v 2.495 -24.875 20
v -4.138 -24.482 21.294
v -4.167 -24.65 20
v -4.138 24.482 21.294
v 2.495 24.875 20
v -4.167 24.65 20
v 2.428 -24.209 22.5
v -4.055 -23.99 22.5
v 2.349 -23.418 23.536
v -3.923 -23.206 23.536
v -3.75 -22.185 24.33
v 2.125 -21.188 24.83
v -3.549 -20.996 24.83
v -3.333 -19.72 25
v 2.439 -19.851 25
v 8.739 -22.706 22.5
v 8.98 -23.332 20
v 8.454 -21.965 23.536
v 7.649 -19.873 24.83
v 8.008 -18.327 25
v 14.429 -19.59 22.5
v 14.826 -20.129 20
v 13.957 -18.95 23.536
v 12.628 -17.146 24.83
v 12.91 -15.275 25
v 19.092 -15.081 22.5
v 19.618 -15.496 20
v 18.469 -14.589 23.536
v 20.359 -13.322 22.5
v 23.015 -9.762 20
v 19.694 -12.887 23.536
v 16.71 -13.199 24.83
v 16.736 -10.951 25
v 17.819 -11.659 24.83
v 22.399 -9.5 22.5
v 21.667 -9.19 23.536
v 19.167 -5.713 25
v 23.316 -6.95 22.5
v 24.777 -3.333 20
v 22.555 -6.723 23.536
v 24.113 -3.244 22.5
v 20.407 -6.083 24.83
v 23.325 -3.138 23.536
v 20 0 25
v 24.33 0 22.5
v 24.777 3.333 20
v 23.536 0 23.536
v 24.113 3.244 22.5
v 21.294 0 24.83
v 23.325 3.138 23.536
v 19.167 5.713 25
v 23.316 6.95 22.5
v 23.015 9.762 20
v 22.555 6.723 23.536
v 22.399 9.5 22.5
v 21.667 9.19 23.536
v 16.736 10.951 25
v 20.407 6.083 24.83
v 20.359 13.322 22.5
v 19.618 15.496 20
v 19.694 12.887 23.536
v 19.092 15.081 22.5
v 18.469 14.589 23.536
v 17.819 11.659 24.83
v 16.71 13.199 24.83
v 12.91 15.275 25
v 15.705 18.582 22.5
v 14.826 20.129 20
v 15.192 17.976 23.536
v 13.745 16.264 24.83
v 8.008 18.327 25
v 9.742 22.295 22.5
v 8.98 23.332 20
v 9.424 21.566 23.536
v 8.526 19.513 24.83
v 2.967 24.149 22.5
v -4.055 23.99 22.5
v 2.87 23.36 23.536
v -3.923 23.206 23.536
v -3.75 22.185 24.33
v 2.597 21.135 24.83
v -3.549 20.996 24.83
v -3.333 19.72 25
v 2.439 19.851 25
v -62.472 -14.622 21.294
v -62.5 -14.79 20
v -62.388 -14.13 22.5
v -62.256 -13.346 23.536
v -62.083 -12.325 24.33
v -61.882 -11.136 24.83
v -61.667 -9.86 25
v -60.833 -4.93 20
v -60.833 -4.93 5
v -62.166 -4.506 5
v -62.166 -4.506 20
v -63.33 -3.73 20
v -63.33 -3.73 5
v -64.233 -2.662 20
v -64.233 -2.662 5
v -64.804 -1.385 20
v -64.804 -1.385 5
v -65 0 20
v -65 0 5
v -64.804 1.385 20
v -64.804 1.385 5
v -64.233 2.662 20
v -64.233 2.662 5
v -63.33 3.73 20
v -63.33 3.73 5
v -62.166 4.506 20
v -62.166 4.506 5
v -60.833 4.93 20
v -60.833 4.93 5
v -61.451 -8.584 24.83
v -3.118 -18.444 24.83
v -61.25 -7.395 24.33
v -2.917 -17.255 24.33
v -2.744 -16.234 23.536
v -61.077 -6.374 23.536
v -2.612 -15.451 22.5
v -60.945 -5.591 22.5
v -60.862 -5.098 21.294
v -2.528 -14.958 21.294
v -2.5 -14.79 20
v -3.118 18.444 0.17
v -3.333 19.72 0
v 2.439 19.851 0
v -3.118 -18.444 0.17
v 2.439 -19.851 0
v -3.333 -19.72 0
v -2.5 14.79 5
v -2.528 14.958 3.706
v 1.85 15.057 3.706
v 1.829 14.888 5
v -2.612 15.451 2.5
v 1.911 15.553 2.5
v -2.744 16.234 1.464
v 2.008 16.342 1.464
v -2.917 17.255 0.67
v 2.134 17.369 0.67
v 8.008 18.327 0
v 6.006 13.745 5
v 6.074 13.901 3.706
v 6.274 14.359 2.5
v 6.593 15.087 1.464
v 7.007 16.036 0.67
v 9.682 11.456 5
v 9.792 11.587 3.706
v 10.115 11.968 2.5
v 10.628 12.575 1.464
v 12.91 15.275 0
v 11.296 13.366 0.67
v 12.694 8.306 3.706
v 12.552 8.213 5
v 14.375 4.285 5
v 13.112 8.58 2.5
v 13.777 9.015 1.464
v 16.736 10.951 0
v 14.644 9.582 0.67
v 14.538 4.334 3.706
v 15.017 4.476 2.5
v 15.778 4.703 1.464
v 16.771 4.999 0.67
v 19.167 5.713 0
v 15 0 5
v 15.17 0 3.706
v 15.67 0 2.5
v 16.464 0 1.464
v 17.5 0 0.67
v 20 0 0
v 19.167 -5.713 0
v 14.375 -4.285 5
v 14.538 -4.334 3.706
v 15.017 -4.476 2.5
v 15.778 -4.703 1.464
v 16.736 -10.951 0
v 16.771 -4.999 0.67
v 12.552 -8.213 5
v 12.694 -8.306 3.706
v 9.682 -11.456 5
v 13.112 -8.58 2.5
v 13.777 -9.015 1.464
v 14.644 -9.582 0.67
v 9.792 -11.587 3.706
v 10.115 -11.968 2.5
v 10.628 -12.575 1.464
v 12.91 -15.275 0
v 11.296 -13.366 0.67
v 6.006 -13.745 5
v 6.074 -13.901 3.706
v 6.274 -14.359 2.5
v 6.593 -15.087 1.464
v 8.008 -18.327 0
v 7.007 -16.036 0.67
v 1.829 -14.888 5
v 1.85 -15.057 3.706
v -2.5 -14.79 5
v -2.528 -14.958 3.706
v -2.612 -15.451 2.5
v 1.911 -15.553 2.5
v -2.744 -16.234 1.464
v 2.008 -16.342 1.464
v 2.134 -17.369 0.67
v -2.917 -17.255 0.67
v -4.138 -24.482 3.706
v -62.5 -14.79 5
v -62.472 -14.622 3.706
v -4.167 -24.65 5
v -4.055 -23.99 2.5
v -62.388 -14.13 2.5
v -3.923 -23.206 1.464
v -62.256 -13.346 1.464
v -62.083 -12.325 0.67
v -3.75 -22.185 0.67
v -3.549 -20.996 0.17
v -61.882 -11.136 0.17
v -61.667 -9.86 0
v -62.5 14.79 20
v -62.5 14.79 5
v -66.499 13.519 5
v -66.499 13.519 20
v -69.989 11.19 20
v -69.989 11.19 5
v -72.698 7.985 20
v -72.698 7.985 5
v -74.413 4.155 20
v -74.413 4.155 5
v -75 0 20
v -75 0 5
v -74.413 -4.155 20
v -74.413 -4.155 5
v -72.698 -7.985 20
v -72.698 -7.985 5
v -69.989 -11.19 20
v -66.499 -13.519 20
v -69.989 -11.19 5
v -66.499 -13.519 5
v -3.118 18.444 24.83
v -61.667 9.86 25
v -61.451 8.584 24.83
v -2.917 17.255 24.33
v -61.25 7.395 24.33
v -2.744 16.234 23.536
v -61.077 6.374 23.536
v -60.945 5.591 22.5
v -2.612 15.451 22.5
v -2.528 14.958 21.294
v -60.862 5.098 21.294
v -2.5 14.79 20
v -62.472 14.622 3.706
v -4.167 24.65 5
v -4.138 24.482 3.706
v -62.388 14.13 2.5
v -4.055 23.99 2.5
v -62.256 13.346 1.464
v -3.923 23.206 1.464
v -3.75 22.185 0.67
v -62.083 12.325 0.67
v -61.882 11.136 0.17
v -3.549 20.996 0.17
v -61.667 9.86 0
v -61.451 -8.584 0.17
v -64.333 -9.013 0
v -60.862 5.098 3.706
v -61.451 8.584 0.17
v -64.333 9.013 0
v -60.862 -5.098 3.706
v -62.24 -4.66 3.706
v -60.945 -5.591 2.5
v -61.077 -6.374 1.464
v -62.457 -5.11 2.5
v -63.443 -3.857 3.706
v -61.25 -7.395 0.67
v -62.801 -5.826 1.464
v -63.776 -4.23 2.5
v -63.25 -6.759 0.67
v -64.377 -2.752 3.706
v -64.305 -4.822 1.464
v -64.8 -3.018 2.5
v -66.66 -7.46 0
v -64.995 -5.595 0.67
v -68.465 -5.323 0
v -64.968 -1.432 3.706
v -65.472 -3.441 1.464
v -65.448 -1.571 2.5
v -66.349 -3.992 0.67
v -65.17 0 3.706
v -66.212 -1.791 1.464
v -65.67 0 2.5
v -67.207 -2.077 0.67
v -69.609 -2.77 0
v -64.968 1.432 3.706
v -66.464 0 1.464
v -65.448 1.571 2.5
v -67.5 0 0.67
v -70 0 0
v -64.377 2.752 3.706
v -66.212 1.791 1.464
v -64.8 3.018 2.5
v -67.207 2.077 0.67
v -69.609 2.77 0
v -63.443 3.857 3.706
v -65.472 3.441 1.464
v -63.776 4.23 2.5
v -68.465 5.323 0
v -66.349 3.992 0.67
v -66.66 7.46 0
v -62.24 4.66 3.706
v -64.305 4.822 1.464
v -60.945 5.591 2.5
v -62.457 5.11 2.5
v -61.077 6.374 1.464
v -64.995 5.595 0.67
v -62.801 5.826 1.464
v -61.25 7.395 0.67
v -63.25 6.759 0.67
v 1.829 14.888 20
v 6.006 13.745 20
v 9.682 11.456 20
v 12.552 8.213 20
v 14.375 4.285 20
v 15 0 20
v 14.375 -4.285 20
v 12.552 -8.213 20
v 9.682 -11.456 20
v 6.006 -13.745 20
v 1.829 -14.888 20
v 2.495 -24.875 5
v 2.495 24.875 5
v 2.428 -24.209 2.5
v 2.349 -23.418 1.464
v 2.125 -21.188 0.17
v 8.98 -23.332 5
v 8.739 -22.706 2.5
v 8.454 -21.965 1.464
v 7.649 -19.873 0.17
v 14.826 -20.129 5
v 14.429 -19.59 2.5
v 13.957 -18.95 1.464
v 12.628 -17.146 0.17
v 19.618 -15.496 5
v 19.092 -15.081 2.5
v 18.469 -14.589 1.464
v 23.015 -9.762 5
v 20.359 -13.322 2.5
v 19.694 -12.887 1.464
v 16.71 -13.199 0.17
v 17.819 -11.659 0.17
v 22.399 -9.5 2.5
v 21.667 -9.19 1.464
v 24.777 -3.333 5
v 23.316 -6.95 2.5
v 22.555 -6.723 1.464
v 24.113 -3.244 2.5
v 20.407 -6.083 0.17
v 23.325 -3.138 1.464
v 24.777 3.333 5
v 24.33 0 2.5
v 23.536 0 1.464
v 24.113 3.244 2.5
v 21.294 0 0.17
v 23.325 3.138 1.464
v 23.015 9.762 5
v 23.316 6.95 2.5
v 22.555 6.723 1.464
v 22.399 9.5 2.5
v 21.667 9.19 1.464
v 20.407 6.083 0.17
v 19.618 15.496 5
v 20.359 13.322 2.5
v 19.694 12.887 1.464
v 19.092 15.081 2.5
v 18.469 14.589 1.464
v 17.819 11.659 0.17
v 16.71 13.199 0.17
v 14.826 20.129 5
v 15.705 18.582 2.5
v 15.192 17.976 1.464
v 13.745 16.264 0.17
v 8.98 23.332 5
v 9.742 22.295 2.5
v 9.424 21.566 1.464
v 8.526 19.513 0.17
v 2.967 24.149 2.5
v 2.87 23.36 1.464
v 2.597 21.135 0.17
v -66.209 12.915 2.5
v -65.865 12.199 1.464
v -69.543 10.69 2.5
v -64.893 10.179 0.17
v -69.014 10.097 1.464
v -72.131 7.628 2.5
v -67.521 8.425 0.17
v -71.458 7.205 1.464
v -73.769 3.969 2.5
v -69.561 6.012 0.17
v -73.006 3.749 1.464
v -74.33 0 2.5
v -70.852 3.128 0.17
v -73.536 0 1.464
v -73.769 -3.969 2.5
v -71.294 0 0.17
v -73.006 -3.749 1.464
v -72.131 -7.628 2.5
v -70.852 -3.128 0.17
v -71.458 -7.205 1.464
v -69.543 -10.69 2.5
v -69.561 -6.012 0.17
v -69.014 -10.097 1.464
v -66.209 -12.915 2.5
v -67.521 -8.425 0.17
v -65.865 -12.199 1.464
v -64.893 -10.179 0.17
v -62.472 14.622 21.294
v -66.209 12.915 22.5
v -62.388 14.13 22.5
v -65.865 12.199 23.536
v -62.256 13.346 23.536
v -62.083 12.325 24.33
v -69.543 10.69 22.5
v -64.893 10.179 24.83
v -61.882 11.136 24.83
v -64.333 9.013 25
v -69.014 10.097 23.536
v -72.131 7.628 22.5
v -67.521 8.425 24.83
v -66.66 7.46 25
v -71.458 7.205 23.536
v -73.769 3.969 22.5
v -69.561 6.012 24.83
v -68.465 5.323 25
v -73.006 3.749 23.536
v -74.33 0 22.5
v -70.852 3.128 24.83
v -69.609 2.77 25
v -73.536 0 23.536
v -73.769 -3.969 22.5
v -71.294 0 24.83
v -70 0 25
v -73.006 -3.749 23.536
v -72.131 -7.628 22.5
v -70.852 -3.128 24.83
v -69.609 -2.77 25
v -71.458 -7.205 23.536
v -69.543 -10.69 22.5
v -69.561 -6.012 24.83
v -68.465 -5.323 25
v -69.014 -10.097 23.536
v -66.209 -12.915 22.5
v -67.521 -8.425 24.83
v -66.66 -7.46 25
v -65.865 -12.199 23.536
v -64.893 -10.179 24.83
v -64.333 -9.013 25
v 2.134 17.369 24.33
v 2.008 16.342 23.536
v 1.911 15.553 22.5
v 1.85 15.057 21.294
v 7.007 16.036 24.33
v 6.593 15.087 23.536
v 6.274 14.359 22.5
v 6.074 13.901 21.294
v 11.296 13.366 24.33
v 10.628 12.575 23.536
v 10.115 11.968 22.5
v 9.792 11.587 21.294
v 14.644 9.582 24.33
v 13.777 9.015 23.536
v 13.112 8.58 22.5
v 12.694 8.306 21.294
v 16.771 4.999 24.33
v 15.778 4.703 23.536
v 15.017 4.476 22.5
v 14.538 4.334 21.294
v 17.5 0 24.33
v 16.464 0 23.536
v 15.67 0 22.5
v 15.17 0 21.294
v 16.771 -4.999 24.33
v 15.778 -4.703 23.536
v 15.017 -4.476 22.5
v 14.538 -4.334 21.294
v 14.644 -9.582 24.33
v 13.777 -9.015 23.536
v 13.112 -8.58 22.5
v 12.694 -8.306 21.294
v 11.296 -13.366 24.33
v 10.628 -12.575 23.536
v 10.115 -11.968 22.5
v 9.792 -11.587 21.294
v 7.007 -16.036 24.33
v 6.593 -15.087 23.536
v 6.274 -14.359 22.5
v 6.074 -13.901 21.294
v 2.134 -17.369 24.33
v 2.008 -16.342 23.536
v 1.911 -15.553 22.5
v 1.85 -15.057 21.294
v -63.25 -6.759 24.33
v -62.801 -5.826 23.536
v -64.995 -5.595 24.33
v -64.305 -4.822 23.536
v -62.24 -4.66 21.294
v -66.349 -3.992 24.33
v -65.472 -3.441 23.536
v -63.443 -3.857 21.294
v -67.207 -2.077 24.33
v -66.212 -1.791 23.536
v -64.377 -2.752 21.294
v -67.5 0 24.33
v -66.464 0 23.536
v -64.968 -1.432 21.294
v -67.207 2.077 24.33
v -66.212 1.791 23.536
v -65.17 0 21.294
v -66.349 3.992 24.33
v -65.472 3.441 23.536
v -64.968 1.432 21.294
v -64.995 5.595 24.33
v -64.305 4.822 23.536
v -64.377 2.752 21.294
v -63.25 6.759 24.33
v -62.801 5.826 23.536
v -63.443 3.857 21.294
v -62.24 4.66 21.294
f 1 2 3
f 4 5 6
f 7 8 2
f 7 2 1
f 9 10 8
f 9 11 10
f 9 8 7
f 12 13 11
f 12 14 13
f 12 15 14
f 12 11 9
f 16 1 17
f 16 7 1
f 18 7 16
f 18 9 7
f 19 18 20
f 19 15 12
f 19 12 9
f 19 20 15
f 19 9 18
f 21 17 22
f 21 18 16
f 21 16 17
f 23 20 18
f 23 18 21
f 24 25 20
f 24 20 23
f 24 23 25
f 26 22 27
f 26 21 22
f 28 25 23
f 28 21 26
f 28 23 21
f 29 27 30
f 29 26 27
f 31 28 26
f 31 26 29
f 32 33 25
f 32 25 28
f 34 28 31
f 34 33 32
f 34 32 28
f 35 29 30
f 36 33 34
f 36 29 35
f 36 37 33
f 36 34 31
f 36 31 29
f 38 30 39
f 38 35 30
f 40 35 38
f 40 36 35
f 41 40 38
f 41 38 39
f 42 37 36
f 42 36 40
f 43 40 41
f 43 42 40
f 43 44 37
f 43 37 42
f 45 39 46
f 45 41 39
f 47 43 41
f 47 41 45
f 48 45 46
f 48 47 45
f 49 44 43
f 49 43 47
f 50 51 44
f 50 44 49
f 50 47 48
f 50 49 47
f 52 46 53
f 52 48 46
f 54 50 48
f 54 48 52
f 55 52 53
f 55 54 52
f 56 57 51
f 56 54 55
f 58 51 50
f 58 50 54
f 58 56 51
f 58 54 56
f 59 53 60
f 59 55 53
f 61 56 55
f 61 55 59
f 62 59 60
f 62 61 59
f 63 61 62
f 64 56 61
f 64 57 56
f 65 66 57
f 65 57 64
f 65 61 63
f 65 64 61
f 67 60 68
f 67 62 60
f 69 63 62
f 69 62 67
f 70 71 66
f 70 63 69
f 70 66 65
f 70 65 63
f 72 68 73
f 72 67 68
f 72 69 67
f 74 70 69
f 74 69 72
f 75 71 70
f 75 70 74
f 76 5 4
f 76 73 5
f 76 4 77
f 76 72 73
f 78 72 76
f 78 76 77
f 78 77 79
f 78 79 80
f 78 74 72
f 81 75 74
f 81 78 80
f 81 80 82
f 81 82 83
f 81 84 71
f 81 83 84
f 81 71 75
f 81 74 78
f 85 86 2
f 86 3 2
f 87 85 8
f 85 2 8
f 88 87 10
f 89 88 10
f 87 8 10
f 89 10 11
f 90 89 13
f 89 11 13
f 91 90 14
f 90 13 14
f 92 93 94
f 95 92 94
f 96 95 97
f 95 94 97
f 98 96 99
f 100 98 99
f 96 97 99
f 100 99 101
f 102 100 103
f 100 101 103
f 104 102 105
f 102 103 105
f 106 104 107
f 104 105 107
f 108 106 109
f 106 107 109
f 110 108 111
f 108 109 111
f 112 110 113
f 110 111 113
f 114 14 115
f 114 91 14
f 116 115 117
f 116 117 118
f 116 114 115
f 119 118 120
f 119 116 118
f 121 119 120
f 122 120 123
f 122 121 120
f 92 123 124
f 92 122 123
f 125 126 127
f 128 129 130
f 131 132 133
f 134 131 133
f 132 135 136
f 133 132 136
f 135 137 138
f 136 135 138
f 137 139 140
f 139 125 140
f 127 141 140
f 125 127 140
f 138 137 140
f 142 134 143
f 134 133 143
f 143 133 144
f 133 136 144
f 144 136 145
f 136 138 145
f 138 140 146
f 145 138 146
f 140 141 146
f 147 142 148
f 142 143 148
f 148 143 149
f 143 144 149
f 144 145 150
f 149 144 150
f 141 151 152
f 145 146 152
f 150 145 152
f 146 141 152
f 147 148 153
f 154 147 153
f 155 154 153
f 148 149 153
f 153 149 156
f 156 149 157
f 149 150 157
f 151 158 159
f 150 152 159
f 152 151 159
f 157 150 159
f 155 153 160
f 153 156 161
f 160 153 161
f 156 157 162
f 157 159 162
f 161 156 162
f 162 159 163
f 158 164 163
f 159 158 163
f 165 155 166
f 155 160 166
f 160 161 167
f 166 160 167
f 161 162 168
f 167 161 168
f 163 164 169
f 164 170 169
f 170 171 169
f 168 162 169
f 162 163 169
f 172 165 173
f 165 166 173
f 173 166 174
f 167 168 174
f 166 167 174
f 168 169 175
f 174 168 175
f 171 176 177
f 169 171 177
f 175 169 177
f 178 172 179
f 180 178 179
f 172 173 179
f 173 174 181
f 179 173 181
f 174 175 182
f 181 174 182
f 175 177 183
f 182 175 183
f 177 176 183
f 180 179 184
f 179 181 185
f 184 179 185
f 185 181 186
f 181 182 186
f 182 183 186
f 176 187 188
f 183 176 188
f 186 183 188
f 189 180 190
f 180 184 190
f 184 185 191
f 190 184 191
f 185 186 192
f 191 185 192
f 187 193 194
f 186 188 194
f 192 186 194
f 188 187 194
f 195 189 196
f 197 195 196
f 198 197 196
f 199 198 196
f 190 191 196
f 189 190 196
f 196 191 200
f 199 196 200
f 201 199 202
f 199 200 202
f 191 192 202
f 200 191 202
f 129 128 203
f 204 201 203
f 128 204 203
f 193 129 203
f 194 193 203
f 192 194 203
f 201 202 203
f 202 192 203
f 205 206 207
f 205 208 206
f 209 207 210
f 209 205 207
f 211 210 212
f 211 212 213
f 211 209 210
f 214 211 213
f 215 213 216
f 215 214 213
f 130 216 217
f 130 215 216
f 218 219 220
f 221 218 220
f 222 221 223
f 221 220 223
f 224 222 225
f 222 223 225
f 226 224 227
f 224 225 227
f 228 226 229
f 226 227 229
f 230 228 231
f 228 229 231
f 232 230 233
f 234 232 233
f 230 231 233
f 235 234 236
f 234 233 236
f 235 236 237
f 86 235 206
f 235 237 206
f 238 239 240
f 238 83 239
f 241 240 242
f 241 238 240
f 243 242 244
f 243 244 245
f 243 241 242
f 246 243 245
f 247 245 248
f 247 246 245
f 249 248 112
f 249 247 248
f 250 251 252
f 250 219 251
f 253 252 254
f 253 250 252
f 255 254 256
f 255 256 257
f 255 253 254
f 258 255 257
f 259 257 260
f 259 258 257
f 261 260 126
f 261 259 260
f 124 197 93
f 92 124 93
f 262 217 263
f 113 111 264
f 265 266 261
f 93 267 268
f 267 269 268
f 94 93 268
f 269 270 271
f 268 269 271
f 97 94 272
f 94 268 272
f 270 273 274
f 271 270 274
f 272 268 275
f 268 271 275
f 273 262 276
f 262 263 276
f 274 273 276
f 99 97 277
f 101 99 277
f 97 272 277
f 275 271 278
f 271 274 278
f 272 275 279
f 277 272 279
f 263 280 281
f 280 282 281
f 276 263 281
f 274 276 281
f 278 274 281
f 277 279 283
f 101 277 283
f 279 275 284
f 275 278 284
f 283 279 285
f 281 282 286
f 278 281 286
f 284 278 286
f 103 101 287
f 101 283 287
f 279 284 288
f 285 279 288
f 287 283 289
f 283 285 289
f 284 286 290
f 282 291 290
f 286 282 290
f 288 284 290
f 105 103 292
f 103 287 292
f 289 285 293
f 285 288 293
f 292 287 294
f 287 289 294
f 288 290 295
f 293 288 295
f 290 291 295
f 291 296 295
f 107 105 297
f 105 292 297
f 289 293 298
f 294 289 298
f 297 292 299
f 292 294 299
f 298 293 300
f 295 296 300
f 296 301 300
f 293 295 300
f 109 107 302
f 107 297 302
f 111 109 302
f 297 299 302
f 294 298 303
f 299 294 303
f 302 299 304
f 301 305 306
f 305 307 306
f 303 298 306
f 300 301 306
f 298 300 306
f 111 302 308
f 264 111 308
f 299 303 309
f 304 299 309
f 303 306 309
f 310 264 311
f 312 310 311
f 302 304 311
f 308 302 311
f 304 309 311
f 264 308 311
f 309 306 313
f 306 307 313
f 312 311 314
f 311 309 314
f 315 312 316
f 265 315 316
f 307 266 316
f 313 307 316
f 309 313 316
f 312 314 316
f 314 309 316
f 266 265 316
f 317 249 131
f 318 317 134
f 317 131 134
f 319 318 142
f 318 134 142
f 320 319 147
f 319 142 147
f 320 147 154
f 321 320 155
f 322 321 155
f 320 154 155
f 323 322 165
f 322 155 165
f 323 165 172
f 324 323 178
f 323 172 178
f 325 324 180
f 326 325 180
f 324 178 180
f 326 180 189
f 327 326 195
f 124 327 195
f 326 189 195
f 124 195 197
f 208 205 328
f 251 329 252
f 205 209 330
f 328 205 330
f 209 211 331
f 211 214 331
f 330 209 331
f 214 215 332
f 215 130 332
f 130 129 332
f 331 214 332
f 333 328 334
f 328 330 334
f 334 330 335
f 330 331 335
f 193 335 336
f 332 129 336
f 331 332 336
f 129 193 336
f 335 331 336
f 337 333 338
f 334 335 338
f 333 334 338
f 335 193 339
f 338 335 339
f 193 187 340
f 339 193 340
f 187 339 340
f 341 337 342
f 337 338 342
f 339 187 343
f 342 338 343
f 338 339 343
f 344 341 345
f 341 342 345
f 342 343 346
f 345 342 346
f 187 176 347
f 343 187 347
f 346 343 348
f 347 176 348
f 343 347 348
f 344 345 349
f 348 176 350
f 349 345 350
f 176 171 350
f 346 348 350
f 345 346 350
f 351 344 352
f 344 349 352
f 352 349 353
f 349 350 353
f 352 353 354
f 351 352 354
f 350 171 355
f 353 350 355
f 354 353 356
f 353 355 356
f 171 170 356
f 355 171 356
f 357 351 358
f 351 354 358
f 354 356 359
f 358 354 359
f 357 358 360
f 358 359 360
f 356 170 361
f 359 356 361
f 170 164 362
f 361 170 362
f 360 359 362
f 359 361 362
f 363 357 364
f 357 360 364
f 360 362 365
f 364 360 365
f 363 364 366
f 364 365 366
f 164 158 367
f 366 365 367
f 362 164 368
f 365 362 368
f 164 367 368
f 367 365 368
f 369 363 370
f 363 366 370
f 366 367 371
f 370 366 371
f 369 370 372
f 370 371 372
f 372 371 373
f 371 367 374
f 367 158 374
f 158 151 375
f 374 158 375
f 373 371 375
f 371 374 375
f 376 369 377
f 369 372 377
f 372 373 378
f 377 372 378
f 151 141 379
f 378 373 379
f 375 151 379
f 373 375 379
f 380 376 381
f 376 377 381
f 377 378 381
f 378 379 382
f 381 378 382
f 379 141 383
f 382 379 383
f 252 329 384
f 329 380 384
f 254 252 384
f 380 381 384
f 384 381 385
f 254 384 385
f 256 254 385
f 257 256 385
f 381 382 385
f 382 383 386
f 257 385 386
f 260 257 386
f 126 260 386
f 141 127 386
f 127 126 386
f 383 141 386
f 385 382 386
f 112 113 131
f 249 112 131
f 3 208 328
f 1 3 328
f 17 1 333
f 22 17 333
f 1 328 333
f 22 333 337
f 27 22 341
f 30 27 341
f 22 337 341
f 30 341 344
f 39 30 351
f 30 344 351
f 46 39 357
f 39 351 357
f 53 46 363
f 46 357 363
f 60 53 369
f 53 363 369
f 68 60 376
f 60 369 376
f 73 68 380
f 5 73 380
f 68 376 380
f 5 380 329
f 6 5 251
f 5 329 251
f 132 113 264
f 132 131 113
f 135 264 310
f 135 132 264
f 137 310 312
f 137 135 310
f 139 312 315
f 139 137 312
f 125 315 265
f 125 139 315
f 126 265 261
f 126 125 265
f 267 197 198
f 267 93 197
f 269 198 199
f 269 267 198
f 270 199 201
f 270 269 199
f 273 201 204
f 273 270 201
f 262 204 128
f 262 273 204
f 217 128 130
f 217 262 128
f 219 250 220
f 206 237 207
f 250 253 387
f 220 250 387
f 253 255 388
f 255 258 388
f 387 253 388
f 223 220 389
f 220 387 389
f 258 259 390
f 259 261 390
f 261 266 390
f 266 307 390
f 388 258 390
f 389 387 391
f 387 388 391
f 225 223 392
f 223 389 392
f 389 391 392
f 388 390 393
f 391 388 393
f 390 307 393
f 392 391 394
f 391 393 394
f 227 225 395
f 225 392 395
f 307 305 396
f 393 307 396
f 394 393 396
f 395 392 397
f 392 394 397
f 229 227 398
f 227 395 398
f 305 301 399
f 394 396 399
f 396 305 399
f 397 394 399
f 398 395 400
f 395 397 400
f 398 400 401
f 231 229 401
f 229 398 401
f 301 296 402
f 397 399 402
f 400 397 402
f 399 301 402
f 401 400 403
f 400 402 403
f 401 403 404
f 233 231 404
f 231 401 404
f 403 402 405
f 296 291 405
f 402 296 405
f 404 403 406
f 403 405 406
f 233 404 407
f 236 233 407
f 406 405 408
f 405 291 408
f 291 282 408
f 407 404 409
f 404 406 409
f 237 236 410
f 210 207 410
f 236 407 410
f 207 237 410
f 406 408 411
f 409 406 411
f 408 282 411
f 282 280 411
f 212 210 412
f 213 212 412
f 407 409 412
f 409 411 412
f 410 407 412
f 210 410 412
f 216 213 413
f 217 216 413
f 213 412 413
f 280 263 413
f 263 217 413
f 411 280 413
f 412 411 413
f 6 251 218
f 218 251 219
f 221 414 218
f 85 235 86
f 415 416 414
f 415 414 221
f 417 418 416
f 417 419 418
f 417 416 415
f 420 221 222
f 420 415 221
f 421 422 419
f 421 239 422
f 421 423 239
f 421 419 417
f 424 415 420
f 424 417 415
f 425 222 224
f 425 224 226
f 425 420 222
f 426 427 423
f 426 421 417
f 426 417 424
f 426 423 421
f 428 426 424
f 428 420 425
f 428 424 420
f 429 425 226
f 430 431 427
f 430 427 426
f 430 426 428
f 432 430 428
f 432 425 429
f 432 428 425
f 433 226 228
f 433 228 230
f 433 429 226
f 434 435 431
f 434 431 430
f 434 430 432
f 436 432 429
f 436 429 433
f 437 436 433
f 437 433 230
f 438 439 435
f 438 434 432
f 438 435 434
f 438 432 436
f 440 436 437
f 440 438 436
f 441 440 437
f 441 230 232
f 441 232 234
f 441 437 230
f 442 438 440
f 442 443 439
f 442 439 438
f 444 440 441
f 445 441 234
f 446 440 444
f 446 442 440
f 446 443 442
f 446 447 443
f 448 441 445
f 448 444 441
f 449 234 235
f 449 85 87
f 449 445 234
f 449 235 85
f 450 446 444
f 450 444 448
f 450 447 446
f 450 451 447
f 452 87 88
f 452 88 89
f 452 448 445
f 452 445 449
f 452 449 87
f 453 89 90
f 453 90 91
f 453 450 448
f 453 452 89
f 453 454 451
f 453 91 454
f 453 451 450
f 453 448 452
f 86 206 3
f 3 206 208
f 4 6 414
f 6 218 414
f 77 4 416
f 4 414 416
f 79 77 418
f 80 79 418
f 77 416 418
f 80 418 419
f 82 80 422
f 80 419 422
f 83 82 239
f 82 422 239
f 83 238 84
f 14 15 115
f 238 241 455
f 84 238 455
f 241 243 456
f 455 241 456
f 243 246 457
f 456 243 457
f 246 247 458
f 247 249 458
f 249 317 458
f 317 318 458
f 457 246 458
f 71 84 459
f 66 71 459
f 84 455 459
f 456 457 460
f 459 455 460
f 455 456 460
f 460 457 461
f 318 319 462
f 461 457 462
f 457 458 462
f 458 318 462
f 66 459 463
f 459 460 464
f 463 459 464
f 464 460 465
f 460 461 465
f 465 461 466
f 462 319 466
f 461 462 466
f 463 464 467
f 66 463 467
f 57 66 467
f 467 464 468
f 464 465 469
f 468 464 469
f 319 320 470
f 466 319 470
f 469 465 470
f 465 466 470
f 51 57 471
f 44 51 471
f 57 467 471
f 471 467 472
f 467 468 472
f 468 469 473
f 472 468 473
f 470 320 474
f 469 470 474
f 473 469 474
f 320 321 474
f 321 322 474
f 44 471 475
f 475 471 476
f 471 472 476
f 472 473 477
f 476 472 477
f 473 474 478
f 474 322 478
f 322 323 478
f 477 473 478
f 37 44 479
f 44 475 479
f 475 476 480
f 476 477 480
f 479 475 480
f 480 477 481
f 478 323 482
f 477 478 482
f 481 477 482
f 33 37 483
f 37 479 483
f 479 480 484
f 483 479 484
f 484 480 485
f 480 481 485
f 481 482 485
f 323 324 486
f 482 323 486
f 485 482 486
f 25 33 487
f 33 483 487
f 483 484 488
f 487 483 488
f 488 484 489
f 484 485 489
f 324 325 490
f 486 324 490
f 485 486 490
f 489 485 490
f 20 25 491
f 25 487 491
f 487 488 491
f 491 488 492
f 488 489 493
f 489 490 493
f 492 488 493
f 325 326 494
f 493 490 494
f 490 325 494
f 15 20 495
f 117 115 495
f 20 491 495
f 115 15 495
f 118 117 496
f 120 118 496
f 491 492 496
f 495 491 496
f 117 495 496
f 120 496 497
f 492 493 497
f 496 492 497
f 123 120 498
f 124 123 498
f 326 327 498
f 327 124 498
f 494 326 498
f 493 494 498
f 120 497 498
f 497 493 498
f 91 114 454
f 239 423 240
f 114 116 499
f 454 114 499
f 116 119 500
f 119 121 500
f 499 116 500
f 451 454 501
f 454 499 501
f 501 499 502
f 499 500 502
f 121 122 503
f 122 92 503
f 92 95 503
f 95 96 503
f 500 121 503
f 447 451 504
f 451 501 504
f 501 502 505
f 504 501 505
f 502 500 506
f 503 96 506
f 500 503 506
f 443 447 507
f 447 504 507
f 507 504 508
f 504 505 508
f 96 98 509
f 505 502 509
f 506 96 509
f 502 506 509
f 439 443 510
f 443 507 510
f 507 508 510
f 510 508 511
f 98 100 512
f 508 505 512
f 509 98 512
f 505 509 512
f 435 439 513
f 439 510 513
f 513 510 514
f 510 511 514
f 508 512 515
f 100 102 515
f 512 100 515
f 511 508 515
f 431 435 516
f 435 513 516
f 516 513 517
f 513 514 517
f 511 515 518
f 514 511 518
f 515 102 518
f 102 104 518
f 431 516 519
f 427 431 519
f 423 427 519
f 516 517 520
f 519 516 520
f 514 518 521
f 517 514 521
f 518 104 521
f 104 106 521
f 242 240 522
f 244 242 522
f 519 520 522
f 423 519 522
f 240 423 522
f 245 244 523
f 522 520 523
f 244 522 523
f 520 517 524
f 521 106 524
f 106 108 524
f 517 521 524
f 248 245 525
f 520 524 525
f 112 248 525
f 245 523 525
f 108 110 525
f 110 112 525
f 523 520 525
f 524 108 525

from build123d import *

# Parameters (mm, degrees)
F1_DEPTH = 25
F2_R     = 5
F3_R     = 4.99999
F4_R     = 4.99999


# Not quite as in the source:
# - a fillet or chamfer is up to 0.001 mm smaller than in the source, because OpenCascade refuses the exact size


with BuildPart() as f1:
    # F0 (on Top) → F1 (new body)
    with BuildSketch(Plane.XY):
        with BuildLine():
            Line((-4.1666666667, 24.6503324296), (-62.5, 14.7901994577))
            ThreePointArc((-62.5, 14.7901994577), (-75, 0), (-62.5, -14.7901994577))
            Line((-62.5, -14.7901994577), (-4.1666666667, -24.6503324296))
            ThreePointArc((-4.1666666667, -24.6503324296), (25, 0), (-4.1666666667, 24.6503324296))
        make_face()
        with BuildLine():
            Line((-60.8333333333, 4.9300664859), (-2.5, 14.7901994577))
            ThreePointArc((-2.5, 14.7901994577), (15, 0), (-2.5, -14.7901994577))
            Line((-2.5, -14.7901994577), (-60.8333333333, -4.9300664859))
            ThreePointArc((-60.8333333333, -4.9300664859), (-65, 0), (-60.8333333333, 4.9300664859))
        make_face(mode=Mode.SUBTRACT)
    extrude(amount=F1_DEPTH)

    # F2
    f2_edges = [f1.edges().sort_by_distance(p)[0] for p in [
        (-33.333333, -19.720266, 25),
        (25, 0, 25),
        (-33.333333, -19.720266, 0),
        (25, 0, 0),
    ]]
    fillet(f2_edges, radius=F2_R)

    # F3 (radius 5 in the source; OpenCascade refuses exactly that, so slightly less here)
    f3_edges = [f1.edges().sort_by_distance(p)[0] for p in [
        (-31.666667, 9.860133, 25),
    ]]
    fillet(f3_edges, radius=F3_R)

    # F4 (radius 5 in the source; OpenCascade refuses exactly that, so slightly less here)
    f4_edges = [f1.edges().sort_by_distance(p)[0] for p in [
        (15, 0, 0),
        (-31.666667, 9.860133, 0),
    ]]
    fillet(f4_edges, radius=F4_R)


solid = f1.part
